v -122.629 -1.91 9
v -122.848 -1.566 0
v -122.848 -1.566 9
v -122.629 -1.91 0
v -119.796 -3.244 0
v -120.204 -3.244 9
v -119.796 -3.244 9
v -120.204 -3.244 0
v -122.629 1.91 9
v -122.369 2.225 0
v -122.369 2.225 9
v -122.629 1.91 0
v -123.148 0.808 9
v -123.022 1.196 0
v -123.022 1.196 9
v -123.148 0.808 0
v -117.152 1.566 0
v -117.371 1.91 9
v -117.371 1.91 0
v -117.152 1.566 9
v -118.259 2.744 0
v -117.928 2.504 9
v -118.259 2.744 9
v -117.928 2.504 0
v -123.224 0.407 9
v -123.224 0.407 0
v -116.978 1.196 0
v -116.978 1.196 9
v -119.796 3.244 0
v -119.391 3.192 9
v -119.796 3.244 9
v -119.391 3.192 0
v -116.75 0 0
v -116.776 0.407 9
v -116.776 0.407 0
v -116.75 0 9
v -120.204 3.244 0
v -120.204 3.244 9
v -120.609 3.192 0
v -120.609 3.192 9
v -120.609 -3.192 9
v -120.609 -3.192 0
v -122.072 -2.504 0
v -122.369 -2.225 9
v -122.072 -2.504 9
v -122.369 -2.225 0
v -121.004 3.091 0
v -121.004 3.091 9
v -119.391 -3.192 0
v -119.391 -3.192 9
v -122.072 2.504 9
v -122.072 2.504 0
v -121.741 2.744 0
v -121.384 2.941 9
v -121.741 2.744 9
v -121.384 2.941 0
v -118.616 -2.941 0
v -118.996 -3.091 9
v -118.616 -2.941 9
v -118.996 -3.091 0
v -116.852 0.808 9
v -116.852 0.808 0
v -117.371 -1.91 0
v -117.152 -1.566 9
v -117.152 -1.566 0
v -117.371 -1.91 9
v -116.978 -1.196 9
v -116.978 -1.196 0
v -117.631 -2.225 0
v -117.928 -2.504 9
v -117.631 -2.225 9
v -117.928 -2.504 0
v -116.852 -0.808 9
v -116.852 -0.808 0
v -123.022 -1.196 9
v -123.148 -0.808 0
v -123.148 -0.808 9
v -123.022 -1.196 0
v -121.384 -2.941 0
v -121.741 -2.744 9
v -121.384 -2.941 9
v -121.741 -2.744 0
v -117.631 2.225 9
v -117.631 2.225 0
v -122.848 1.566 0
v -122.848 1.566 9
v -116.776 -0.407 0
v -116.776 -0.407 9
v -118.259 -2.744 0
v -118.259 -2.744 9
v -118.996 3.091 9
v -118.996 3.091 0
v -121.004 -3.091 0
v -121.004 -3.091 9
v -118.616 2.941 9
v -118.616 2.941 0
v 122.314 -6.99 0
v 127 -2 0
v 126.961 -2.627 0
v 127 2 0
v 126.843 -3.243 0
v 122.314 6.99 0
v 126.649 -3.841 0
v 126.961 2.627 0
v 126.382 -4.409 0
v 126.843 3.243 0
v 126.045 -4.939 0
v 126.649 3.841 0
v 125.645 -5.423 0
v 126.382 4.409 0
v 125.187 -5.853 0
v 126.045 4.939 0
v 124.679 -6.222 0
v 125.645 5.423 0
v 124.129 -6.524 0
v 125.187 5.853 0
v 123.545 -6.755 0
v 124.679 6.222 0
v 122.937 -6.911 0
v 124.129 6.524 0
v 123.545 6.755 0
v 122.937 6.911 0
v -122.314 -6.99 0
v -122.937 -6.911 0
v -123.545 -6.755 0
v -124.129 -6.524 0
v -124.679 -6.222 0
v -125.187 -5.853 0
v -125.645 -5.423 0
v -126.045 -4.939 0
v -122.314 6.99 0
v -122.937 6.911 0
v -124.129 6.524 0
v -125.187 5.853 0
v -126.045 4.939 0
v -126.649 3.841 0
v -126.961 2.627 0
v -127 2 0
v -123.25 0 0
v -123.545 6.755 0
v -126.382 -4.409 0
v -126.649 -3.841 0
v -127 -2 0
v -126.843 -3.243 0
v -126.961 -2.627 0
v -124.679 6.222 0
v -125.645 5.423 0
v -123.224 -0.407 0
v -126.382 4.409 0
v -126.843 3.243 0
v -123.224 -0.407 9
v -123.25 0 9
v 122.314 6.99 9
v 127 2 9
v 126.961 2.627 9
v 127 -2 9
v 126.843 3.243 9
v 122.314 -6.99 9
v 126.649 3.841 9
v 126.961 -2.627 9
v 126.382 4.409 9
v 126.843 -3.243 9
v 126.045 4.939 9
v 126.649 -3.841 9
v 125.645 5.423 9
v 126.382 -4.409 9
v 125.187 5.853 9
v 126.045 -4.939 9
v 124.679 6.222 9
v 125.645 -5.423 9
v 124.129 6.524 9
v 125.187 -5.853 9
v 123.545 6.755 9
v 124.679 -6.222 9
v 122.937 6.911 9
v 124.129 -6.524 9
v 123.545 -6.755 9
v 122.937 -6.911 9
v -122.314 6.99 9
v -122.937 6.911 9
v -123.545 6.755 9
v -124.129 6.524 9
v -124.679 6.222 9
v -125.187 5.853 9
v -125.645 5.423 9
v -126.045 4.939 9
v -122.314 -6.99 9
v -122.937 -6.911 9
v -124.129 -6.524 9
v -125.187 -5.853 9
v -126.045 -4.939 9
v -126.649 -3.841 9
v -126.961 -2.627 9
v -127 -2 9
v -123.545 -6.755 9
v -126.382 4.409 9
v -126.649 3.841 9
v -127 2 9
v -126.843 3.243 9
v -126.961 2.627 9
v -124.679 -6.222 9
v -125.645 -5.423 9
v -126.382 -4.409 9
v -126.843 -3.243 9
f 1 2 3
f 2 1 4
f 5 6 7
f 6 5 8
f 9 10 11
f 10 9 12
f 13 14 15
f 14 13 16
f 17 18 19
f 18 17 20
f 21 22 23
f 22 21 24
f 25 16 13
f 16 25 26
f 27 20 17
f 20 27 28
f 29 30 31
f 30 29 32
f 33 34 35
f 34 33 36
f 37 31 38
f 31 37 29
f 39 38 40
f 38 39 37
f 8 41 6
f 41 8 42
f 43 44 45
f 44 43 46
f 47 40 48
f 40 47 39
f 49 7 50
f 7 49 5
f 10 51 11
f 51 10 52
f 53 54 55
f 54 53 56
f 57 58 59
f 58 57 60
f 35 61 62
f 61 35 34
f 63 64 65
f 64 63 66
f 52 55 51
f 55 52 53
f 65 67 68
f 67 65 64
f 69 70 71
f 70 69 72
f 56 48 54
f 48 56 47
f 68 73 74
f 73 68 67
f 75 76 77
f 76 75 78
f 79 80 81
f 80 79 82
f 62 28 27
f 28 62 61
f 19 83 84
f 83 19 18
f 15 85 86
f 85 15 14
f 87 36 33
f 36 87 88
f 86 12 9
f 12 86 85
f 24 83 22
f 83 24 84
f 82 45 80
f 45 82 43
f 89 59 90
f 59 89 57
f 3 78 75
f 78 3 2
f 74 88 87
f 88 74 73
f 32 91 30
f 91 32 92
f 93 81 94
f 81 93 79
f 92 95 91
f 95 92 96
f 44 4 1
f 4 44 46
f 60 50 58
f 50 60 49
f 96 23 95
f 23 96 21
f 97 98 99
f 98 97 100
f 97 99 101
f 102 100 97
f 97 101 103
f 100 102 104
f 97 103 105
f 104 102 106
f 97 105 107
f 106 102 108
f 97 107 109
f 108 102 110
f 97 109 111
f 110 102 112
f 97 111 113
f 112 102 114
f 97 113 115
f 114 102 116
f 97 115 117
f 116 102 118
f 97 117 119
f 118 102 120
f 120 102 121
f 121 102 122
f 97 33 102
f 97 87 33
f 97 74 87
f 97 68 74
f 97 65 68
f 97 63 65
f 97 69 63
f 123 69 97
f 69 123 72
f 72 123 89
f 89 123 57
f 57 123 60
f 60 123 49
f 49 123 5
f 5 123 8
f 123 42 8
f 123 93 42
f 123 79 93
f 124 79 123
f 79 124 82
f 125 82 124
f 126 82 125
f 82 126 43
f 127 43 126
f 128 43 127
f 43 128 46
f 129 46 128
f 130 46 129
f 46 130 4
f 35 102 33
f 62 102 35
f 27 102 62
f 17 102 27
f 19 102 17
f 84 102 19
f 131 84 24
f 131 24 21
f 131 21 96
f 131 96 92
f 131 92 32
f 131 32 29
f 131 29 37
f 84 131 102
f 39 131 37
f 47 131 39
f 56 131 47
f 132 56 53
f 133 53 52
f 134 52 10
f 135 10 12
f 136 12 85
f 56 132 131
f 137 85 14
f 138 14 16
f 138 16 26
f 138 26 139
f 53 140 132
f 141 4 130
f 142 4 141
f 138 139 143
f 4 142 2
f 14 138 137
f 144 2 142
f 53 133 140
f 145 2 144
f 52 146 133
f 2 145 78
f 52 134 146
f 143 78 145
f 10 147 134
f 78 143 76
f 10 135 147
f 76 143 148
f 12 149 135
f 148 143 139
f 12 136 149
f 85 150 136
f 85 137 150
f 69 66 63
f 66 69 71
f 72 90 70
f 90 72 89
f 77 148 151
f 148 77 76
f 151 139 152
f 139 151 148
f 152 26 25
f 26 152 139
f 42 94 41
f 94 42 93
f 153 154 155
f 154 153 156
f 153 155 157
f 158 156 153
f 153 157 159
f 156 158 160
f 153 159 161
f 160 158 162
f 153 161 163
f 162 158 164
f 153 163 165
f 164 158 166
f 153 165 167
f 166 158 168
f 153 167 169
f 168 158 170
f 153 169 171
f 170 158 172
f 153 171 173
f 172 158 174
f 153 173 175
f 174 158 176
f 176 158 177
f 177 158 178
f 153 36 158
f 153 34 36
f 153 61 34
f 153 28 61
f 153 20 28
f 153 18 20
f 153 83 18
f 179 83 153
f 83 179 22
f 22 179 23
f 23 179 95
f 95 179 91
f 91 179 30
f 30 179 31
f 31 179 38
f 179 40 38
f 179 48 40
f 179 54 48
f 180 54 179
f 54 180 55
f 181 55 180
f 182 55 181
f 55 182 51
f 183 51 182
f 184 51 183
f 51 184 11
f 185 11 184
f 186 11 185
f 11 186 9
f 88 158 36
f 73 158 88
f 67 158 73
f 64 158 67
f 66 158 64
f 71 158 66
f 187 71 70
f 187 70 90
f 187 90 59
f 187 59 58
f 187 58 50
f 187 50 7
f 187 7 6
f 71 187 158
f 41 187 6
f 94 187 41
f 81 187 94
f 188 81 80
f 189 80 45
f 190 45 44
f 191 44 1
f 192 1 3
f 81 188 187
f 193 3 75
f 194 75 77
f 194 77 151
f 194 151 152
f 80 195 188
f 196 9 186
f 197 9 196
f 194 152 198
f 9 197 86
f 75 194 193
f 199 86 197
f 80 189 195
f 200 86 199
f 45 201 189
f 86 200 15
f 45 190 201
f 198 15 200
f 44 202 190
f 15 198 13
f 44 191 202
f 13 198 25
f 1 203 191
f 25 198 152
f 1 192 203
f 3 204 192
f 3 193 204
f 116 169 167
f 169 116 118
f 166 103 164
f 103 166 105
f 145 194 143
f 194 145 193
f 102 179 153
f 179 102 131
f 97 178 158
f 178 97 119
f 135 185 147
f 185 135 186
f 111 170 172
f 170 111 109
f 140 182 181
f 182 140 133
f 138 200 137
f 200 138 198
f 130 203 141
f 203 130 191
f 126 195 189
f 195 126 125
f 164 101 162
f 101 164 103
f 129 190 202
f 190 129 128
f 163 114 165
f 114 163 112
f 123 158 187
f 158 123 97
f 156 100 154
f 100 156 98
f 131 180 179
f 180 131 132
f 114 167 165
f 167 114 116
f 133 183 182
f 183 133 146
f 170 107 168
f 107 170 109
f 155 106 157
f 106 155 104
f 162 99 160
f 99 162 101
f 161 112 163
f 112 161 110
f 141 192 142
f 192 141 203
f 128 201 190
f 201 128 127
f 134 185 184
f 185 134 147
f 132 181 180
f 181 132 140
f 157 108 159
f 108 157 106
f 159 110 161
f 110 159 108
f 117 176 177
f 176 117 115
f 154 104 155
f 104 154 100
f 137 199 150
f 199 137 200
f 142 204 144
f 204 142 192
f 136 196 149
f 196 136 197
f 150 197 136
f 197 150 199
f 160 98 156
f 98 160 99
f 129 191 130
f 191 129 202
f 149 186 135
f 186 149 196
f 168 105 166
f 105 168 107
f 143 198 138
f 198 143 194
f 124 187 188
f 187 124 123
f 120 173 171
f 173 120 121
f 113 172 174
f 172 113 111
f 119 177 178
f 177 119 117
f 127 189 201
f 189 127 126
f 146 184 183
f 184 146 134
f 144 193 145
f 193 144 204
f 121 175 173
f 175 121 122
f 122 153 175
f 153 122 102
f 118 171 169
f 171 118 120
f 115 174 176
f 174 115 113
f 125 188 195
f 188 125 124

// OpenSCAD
$fn = 50;


difference() {
	union() {
		hull() {
			translate(v = [-122.0000000000, 2.0000000000, 0]) {
				cylinder(h = 9, r = 5);
			}
			translate(v = [122.0000000000, 2.0000000000, 0]) {
				cylinder(h = 9, r = 5);
			}
			translate(v = [-122.0000000000, -2.0000000000, 0]) {
				cylinder(h = 9, r = 5);
			}
			translate(v = [122.0000000000, -2.0000000000, 0]) {
				cylinder(h = 9, r = 5);
			}
		}
	}
	union() {
		translate(v = [-120.0000000000, 0.0000000000, 0]) {
			cylinder(h = 9, r = 3.2500000000);
		}
		translate(v = [-120.0000000000, 0.0000000000, 0]) {
			cylinder(h = 9, r = 1.8000000000);
		}
		translate(v = [-120.0000000000, 0.0000000000, 0]) {
			cylinder(h = 9, r = 1.8000000000);
		}
		translate(v = [-120.0000000000, 0.0000000000, 0]) {
			cylinder(h = 9, r = 1.8000000000);
		}
	}
}
